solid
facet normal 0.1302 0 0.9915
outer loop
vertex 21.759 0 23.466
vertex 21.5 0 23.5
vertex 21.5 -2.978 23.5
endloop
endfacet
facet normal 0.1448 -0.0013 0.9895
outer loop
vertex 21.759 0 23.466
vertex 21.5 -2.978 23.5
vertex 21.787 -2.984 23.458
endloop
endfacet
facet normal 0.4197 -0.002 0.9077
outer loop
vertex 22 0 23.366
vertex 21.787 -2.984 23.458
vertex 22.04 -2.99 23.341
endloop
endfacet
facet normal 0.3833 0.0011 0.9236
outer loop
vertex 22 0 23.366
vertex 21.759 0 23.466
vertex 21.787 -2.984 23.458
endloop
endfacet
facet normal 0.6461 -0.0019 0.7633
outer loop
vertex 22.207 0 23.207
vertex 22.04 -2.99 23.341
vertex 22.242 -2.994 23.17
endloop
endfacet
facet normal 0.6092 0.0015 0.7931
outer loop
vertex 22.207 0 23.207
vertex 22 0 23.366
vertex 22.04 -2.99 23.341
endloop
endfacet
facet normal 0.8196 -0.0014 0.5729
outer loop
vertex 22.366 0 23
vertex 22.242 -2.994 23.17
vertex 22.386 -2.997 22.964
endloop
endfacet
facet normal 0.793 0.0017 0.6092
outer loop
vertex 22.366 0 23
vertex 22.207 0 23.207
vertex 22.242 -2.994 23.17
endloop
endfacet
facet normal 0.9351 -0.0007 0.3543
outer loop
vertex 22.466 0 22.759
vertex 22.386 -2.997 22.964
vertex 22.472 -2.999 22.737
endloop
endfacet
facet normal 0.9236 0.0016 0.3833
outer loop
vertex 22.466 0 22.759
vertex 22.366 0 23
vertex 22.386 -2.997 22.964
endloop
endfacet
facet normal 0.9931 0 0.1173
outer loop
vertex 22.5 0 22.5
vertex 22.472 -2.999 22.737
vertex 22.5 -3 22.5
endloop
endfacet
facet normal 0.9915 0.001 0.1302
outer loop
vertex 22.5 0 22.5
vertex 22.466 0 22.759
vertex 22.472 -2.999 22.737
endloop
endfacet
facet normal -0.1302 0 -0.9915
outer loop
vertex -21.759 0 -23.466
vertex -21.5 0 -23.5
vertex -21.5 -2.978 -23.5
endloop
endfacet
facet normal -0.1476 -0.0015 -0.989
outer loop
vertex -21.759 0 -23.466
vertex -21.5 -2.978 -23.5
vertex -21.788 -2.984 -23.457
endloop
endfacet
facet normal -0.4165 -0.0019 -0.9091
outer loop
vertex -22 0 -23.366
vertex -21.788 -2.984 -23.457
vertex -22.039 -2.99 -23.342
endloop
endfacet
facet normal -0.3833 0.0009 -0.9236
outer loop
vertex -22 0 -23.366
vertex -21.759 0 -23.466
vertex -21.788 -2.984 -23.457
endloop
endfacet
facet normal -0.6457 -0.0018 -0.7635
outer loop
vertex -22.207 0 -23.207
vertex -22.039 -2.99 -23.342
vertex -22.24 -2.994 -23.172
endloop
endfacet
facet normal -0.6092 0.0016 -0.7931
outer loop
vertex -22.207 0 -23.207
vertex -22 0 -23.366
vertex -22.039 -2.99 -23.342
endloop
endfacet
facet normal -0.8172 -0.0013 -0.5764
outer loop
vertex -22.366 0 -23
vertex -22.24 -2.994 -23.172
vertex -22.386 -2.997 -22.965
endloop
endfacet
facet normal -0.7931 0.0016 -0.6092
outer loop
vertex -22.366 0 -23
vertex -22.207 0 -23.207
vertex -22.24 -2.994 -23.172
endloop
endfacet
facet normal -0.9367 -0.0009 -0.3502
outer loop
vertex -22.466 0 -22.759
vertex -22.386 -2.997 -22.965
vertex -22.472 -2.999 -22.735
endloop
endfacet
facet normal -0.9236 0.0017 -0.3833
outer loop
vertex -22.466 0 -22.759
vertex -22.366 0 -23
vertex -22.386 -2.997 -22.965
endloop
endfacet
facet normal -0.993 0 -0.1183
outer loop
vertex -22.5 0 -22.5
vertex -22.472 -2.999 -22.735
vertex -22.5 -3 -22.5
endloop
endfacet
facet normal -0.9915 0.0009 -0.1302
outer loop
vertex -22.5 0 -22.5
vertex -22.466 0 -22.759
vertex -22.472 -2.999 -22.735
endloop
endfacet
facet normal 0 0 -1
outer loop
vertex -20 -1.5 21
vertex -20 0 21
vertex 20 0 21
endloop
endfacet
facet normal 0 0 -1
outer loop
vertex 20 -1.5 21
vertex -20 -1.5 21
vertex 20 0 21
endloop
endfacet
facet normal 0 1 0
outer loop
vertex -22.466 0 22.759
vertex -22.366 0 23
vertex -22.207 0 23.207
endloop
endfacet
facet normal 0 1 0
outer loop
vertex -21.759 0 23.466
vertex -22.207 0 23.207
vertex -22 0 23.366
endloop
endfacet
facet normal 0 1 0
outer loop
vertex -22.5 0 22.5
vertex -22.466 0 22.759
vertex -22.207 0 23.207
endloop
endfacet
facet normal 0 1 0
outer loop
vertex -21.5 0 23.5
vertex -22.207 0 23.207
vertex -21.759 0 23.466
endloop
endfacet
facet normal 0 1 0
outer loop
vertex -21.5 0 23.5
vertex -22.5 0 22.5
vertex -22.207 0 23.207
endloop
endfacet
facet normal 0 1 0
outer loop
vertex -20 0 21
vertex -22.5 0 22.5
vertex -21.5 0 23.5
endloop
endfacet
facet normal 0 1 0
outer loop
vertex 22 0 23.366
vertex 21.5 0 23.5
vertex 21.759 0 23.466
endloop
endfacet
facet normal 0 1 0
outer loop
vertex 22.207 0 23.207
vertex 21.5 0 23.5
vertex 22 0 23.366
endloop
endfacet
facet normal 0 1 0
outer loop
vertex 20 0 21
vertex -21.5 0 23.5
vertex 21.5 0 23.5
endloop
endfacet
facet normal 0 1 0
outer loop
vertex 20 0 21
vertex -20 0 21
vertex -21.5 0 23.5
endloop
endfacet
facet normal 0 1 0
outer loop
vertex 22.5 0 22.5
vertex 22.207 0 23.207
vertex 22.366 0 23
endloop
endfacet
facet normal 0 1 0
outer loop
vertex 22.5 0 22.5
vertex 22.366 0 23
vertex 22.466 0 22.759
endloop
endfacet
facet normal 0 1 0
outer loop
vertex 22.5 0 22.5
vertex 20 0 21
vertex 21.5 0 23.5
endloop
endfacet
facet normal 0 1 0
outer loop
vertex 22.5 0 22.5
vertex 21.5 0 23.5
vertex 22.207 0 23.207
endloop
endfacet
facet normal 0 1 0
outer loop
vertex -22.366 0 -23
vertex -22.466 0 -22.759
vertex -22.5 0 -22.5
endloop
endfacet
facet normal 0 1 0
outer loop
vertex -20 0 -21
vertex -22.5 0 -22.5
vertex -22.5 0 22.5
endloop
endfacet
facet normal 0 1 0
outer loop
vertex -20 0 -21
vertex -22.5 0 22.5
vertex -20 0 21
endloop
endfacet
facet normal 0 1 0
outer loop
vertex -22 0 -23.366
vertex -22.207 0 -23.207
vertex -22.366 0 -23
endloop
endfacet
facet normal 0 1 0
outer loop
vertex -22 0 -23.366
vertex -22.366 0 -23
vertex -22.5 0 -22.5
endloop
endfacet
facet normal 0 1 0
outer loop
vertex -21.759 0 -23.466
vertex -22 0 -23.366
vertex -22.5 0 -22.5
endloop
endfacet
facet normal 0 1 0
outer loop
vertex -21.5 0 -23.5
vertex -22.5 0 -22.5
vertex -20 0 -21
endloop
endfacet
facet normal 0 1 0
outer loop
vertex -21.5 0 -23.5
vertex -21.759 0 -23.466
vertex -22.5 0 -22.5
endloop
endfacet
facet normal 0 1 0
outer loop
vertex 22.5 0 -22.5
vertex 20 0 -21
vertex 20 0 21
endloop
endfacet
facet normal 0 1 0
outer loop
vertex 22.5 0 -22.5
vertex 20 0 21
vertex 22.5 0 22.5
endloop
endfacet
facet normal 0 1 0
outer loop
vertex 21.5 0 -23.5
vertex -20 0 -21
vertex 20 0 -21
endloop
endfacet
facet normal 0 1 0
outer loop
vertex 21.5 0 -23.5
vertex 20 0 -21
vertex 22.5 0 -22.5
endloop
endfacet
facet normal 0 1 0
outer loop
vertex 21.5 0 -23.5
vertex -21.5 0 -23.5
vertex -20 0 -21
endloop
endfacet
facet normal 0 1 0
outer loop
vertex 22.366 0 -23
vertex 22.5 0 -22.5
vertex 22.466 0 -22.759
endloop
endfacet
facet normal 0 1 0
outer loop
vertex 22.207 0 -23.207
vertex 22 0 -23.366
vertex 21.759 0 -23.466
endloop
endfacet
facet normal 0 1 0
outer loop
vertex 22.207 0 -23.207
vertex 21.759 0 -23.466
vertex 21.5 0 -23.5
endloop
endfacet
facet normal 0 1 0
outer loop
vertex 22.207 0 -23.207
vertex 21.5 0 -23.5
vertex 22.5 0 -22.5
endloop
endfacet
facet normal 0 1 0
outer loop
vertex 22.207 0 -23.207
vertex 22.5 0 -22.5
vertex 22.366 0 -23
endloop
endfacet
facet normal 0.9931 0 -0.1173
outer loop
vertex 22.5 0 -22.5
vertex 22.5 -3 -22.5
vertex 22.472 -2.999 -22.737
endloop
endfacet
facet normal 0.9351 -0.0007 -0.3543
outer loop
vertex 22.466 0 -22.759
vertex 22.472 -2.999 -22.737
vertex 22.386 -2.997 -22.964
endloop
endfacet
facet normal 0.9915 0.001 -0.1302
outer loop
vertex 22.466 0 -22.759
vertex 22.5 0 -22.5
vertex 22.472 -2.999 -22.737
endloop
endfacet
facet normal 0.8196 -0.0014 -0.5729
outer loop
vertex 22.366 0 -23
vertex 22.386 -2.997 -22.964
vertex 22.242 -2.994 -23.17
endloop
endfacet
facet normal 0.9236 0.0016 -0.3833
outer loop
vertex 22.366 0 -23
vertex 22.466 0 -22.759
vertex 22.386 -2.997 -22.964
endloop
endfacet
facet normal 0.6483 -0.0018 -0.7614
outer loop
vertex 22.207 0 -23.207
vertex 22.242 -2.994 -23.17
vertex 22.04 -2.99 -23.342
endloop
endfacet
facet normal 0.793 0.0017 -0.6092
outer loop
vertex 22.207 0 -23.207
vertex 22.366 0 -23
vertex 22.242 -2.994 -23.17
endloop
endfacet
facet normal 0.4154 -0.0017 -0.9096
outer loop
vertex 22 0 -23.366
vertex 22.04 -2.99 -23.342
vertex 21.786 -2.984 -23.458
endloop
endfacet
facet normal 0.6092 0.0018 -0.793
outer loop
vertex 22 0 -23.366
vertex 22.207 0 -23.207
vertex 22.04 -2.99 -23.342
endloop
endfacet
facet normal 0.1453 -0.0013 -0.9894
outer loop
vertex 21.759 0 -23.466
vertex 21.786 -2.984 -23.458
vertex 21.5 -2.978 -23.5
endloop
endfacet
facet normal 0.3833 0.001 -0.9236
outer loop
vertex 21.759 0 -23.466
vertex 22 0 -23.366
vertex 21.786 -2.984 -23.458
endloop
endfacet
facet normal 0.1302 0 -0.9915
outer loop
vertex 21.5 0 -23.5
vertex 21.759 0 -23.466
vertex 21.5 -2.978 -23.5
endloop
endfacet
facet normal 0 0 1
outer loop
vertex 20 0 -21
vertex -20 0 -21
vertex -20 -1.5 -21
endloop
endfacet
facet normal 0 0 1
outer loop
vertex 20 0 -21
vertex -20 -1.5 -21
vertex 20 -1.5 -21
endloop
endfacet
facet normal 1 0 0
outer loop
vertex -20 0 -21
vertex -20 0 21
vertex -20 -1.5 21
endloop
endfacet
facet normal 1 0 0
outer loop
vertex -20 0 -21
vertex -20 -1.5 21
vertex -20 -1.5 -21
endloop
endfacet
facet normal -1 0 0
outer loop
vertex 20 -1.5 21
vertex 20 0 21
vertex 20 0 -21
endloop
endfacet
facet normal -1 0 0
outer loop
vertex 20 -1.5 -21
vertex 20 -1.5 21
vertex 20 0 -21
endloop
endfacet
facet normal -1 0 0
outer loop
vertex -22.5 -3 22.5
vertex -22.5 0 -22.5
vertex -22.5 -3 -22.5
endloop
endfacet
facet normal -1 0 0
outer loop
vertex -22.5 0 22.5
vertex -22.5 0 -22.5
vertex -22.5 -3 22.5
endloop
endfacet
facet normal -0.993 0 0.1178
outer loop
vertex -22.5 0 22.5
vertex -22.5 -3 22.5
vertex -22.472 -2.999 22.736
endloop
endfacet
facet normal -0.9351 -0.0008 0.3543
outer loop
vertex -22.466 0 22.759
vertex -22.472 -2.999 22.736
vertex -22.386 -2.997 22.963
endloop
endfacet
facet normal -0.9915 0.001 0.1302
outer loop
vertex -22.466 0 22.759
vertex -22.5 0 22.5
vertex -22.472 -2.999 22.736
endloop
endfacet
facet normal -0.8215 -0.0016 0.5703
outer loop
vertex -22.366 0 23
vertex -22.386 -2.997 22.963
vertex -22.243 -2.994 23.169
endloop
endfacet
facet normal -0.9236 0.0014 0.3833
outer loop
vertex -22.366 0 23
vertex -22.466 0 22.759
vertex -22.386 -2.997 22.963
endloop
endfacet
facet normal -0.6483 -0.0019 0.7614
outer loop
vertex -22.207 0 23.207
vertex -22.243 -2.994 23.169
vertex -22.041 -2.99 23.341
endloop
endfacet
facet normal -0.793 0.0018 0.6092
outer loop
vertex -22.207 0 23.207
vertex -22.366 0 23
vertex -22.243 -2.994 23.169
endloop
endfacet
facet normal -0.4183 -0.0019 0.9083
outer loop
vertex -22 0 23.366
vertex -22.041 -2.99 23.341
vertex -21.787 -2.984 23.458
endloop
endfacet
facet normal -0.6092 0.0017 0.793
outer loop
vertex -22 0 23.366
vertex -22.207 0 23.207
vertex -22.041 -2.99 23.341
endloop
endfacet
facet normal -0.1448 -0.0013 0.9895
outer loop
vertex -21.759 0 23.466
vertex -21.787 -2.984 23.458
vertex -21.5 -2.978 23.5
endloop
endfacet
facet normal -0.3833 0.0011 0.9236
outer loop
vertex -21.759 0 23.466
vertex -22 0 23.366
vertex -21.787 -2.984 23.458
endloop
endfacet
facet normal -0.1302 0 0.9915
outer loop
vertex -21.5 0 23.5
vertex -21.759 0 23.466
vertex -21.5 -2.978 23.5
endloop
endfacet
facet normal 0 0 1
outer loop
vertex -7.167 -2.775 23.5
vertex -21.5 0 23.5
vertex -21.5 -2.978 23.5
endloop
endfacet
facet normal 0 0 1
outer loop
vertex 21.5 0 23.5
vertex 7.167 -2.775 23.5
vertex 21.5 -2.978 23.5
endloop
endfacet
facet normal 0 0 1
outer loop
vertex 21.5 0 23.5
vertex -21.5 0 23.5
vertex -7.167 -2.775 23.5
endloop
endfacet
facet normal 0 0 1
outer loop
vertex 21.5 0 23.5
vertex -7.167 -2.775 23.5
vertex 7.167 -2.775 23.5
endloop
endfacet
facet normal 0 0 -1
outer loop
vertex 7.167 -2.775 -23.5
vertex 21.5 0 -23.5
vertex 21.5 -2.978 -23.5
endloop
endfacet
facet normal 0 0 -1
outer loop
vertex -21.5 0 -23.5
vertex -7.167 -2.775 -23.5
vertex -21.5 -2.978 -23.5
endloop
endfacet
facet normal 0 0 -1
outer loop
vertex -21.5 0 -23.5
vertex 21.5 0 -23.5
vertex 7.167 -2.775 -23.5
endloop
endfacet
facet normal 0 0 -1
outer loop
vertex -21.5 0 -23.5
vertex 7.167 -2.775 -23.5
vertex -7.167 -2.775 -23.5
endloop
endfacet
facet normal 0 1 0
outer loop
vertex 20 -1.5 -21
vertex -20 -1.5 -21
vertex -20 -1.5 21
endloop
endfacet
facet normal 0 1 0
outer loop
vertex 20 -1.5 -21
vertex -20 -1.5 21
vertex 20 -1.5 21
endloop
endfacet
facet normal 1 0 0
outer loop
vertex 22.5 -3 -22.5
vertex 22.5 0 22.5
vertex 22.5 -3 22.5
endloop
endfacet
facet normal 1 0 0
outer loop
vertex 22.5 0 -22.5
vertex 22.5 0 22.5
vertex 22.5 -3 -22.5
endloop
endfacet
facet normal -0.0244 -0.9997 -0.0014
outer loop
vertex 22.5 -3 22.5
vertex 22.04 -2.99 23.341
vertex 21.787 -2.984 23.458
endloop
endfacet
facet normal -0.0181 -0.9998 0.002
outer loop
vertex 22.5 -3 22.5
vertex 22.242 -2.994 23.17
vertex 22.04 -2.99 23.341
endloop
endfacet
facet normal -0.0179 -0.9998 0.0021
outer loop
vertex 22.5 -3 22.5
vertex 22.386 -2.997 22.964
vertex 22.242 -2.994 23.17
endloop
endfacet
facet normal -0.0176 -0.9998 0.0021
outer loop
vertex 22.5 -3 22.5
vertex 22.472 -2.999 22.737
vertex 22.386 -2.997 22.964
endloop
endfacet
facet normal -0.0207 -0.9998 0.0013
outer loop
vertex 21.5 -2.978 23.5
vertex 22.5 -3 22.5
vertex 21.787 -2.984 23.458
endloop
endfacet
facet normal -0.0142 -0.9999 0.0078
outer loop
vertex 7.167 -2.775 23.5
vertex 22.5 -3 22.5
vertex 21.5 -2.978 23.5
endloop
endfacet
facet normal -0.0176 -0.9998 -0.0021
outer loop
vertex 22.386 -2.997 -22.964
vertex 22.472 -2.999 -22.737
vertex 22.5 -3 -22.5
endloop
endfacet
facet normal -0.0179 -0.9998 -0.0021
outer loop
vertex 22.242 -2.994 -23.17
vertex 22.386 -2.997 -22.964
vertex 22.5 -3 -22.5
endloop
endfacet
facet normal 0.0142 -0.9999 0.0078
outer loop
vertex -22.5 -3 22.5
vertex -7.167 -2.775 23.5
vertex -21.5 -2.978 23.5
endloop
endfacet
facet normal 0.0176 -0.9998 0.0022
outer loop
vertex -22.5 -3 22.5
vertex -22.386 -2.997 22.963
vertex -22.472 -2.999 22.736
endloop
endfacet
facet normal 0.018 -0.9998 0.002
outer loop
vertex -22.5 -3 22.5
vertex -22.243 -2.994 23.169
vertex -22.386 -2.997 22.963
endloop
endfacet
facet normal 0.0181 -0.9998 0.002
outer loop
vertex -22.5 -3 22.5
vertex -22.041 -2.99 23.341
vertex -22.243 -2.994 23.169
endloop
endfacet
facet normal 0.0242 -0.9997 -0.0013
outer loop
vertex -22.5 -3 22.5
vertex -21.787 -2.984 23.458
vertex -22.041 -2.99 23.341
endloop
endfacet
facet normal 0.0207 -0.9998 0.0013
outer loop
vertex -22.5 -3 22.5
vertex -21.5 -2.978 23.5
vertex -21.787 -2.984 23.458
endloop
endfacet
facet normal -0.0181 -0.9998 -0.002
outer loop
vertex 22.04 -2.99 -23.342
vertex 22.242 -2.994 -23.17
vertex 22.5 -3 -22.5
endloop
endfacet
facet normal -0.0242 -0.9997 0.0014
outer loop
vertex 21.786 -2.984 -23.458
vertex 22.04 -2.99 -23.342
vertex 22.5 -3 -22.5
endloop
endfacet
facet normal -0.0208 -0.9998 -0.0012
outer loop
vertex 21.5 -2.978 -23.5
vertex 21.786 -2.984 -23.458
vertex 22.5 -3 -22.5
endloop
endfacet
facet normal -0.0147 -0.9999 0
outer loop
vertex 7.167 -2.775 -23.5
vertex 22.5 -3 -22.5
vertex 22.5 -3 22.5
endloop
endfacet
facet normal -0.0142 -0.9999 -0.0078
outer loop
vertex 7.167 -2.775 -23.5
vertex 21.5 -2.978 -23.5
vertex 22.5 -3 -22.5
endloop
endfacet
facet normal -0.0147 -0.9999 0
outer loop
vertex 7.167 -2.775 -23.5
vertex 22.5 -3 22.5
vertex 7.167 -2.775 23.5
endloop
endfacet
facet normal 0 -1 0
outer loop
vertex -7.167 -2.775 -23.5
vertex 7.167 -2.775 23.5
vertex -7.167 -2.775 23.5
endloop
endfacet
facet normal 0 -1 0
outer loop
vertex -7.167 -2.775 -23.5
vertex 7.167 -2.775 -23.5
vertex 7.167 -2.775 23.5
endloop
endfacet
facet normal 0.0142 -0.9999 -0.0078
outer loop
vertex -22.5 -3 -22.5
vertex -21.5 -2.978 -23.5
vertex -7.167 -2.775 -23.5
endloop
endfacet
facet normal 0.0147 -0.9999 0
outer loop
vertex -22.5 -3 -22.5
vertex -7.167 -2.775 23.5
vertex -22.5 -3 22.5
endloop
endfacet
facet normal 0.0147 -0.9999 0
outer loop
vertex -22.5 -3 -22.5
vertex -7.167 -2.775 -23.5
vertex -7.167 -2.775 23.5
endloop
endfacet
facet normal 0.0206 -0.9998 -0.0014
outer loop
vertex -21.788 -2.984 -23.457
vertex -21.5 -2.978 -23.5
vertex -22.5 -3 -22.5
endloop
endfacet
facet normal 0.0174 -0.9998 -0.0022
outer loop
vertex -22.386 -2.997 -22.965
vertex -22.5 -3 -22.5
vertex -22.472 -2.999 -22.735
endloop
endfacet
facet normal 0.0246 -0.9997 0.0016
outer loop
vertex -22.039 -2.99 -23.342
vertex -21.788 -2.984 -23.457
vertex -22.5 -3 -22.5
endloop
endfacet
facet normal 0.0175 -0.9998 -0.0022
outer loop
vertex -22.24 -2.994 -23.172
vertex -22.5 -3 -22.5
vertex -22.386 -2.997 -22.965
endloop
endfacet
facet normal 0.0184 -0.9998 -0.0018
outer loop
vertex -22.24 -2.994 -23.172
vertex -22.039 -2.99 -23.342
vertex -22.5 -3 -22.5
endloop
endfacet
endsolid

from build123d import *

# Parameters (mm, degrees)
BOSS_EXTRUDE1_DEPTH     = 3
CUT_EXTRUDE1_DEPTH      = 33.672618505
CUT_EXTRUDE1_DEPTH_BACK = 33.672618505
SKETCH4_W               = 40
SKETCH4_H               = 42
CUT_EXTRUDE2_DEPTH      = 1.5


with BuildPart() as part:
    # Sketch1 → Boss-Extrude1 (new body)
    with BuildSketch(Plane(origin=(0, 0, 0), x_dir=(1, 0, 0), z_dir=(0, 1, 0))):
        with BuildLine():
            Line((21.5, 23.5), (-21.5, 23.5))
            ThreePointArc((-21.5, 23.5), (-22.207106781, 23.207106781), (-22.5, 22.5))
            Line((-22.5, 22.5), (-22.5, -22.5))
            ThreePointArc((-22.5, -22.5), (-22.207106781, -23.207106781), (-21.5, -23.5))
            Line((-21.5, -23.5), (21.5, -23.5))
            ThreePointArc((21.5, -23.5), (22.207106781, -23.207106781), (22.5, -22.5))
            Line((22.5, -22.5), (22.5, 22.5))
            ThreePointArc((22.5, 22.5), (22.207106781, 23.207106781), (21.5, 23.5))
        make_face()
    extrude(amount=-BOSS_EXTRUDE1_DEPTH)

    # Sketch2 → Cut-Extrude1 (cut, two sides: drawn at the far end of the back side and taken through both)
    with BuildSketch(Plane.XY.offset(-CUT_EXTRUDE1_DEPTH_BACK)):
        with BuildLine():
            Line((-22.5, -3), (22.5, -3))
            ThreePointArc((22.5, -3), (0, -2.75), (-22.5, -3))
        make_face()
    extrude(amount=CUT_EXTRUDE1_DEPTH + CUT_EXTRUDE1_DEPTH_BACK, mode=Mode.SUBTRACT)

    # Sketch4 → Cut-Extrude2 (cut)
    with BuildSketch(Plane(origin=(0, 0, 0), x_dir=(1, 0, 0), z_dir=(0, 1, 0))):
        Rectangle(SKETCH4_W, SKETCH4_H)
    extrude(amount=-CUT_EXTRUDE2_DEPTH, mode=Mode.SUBTRACT)


solid = part.part
